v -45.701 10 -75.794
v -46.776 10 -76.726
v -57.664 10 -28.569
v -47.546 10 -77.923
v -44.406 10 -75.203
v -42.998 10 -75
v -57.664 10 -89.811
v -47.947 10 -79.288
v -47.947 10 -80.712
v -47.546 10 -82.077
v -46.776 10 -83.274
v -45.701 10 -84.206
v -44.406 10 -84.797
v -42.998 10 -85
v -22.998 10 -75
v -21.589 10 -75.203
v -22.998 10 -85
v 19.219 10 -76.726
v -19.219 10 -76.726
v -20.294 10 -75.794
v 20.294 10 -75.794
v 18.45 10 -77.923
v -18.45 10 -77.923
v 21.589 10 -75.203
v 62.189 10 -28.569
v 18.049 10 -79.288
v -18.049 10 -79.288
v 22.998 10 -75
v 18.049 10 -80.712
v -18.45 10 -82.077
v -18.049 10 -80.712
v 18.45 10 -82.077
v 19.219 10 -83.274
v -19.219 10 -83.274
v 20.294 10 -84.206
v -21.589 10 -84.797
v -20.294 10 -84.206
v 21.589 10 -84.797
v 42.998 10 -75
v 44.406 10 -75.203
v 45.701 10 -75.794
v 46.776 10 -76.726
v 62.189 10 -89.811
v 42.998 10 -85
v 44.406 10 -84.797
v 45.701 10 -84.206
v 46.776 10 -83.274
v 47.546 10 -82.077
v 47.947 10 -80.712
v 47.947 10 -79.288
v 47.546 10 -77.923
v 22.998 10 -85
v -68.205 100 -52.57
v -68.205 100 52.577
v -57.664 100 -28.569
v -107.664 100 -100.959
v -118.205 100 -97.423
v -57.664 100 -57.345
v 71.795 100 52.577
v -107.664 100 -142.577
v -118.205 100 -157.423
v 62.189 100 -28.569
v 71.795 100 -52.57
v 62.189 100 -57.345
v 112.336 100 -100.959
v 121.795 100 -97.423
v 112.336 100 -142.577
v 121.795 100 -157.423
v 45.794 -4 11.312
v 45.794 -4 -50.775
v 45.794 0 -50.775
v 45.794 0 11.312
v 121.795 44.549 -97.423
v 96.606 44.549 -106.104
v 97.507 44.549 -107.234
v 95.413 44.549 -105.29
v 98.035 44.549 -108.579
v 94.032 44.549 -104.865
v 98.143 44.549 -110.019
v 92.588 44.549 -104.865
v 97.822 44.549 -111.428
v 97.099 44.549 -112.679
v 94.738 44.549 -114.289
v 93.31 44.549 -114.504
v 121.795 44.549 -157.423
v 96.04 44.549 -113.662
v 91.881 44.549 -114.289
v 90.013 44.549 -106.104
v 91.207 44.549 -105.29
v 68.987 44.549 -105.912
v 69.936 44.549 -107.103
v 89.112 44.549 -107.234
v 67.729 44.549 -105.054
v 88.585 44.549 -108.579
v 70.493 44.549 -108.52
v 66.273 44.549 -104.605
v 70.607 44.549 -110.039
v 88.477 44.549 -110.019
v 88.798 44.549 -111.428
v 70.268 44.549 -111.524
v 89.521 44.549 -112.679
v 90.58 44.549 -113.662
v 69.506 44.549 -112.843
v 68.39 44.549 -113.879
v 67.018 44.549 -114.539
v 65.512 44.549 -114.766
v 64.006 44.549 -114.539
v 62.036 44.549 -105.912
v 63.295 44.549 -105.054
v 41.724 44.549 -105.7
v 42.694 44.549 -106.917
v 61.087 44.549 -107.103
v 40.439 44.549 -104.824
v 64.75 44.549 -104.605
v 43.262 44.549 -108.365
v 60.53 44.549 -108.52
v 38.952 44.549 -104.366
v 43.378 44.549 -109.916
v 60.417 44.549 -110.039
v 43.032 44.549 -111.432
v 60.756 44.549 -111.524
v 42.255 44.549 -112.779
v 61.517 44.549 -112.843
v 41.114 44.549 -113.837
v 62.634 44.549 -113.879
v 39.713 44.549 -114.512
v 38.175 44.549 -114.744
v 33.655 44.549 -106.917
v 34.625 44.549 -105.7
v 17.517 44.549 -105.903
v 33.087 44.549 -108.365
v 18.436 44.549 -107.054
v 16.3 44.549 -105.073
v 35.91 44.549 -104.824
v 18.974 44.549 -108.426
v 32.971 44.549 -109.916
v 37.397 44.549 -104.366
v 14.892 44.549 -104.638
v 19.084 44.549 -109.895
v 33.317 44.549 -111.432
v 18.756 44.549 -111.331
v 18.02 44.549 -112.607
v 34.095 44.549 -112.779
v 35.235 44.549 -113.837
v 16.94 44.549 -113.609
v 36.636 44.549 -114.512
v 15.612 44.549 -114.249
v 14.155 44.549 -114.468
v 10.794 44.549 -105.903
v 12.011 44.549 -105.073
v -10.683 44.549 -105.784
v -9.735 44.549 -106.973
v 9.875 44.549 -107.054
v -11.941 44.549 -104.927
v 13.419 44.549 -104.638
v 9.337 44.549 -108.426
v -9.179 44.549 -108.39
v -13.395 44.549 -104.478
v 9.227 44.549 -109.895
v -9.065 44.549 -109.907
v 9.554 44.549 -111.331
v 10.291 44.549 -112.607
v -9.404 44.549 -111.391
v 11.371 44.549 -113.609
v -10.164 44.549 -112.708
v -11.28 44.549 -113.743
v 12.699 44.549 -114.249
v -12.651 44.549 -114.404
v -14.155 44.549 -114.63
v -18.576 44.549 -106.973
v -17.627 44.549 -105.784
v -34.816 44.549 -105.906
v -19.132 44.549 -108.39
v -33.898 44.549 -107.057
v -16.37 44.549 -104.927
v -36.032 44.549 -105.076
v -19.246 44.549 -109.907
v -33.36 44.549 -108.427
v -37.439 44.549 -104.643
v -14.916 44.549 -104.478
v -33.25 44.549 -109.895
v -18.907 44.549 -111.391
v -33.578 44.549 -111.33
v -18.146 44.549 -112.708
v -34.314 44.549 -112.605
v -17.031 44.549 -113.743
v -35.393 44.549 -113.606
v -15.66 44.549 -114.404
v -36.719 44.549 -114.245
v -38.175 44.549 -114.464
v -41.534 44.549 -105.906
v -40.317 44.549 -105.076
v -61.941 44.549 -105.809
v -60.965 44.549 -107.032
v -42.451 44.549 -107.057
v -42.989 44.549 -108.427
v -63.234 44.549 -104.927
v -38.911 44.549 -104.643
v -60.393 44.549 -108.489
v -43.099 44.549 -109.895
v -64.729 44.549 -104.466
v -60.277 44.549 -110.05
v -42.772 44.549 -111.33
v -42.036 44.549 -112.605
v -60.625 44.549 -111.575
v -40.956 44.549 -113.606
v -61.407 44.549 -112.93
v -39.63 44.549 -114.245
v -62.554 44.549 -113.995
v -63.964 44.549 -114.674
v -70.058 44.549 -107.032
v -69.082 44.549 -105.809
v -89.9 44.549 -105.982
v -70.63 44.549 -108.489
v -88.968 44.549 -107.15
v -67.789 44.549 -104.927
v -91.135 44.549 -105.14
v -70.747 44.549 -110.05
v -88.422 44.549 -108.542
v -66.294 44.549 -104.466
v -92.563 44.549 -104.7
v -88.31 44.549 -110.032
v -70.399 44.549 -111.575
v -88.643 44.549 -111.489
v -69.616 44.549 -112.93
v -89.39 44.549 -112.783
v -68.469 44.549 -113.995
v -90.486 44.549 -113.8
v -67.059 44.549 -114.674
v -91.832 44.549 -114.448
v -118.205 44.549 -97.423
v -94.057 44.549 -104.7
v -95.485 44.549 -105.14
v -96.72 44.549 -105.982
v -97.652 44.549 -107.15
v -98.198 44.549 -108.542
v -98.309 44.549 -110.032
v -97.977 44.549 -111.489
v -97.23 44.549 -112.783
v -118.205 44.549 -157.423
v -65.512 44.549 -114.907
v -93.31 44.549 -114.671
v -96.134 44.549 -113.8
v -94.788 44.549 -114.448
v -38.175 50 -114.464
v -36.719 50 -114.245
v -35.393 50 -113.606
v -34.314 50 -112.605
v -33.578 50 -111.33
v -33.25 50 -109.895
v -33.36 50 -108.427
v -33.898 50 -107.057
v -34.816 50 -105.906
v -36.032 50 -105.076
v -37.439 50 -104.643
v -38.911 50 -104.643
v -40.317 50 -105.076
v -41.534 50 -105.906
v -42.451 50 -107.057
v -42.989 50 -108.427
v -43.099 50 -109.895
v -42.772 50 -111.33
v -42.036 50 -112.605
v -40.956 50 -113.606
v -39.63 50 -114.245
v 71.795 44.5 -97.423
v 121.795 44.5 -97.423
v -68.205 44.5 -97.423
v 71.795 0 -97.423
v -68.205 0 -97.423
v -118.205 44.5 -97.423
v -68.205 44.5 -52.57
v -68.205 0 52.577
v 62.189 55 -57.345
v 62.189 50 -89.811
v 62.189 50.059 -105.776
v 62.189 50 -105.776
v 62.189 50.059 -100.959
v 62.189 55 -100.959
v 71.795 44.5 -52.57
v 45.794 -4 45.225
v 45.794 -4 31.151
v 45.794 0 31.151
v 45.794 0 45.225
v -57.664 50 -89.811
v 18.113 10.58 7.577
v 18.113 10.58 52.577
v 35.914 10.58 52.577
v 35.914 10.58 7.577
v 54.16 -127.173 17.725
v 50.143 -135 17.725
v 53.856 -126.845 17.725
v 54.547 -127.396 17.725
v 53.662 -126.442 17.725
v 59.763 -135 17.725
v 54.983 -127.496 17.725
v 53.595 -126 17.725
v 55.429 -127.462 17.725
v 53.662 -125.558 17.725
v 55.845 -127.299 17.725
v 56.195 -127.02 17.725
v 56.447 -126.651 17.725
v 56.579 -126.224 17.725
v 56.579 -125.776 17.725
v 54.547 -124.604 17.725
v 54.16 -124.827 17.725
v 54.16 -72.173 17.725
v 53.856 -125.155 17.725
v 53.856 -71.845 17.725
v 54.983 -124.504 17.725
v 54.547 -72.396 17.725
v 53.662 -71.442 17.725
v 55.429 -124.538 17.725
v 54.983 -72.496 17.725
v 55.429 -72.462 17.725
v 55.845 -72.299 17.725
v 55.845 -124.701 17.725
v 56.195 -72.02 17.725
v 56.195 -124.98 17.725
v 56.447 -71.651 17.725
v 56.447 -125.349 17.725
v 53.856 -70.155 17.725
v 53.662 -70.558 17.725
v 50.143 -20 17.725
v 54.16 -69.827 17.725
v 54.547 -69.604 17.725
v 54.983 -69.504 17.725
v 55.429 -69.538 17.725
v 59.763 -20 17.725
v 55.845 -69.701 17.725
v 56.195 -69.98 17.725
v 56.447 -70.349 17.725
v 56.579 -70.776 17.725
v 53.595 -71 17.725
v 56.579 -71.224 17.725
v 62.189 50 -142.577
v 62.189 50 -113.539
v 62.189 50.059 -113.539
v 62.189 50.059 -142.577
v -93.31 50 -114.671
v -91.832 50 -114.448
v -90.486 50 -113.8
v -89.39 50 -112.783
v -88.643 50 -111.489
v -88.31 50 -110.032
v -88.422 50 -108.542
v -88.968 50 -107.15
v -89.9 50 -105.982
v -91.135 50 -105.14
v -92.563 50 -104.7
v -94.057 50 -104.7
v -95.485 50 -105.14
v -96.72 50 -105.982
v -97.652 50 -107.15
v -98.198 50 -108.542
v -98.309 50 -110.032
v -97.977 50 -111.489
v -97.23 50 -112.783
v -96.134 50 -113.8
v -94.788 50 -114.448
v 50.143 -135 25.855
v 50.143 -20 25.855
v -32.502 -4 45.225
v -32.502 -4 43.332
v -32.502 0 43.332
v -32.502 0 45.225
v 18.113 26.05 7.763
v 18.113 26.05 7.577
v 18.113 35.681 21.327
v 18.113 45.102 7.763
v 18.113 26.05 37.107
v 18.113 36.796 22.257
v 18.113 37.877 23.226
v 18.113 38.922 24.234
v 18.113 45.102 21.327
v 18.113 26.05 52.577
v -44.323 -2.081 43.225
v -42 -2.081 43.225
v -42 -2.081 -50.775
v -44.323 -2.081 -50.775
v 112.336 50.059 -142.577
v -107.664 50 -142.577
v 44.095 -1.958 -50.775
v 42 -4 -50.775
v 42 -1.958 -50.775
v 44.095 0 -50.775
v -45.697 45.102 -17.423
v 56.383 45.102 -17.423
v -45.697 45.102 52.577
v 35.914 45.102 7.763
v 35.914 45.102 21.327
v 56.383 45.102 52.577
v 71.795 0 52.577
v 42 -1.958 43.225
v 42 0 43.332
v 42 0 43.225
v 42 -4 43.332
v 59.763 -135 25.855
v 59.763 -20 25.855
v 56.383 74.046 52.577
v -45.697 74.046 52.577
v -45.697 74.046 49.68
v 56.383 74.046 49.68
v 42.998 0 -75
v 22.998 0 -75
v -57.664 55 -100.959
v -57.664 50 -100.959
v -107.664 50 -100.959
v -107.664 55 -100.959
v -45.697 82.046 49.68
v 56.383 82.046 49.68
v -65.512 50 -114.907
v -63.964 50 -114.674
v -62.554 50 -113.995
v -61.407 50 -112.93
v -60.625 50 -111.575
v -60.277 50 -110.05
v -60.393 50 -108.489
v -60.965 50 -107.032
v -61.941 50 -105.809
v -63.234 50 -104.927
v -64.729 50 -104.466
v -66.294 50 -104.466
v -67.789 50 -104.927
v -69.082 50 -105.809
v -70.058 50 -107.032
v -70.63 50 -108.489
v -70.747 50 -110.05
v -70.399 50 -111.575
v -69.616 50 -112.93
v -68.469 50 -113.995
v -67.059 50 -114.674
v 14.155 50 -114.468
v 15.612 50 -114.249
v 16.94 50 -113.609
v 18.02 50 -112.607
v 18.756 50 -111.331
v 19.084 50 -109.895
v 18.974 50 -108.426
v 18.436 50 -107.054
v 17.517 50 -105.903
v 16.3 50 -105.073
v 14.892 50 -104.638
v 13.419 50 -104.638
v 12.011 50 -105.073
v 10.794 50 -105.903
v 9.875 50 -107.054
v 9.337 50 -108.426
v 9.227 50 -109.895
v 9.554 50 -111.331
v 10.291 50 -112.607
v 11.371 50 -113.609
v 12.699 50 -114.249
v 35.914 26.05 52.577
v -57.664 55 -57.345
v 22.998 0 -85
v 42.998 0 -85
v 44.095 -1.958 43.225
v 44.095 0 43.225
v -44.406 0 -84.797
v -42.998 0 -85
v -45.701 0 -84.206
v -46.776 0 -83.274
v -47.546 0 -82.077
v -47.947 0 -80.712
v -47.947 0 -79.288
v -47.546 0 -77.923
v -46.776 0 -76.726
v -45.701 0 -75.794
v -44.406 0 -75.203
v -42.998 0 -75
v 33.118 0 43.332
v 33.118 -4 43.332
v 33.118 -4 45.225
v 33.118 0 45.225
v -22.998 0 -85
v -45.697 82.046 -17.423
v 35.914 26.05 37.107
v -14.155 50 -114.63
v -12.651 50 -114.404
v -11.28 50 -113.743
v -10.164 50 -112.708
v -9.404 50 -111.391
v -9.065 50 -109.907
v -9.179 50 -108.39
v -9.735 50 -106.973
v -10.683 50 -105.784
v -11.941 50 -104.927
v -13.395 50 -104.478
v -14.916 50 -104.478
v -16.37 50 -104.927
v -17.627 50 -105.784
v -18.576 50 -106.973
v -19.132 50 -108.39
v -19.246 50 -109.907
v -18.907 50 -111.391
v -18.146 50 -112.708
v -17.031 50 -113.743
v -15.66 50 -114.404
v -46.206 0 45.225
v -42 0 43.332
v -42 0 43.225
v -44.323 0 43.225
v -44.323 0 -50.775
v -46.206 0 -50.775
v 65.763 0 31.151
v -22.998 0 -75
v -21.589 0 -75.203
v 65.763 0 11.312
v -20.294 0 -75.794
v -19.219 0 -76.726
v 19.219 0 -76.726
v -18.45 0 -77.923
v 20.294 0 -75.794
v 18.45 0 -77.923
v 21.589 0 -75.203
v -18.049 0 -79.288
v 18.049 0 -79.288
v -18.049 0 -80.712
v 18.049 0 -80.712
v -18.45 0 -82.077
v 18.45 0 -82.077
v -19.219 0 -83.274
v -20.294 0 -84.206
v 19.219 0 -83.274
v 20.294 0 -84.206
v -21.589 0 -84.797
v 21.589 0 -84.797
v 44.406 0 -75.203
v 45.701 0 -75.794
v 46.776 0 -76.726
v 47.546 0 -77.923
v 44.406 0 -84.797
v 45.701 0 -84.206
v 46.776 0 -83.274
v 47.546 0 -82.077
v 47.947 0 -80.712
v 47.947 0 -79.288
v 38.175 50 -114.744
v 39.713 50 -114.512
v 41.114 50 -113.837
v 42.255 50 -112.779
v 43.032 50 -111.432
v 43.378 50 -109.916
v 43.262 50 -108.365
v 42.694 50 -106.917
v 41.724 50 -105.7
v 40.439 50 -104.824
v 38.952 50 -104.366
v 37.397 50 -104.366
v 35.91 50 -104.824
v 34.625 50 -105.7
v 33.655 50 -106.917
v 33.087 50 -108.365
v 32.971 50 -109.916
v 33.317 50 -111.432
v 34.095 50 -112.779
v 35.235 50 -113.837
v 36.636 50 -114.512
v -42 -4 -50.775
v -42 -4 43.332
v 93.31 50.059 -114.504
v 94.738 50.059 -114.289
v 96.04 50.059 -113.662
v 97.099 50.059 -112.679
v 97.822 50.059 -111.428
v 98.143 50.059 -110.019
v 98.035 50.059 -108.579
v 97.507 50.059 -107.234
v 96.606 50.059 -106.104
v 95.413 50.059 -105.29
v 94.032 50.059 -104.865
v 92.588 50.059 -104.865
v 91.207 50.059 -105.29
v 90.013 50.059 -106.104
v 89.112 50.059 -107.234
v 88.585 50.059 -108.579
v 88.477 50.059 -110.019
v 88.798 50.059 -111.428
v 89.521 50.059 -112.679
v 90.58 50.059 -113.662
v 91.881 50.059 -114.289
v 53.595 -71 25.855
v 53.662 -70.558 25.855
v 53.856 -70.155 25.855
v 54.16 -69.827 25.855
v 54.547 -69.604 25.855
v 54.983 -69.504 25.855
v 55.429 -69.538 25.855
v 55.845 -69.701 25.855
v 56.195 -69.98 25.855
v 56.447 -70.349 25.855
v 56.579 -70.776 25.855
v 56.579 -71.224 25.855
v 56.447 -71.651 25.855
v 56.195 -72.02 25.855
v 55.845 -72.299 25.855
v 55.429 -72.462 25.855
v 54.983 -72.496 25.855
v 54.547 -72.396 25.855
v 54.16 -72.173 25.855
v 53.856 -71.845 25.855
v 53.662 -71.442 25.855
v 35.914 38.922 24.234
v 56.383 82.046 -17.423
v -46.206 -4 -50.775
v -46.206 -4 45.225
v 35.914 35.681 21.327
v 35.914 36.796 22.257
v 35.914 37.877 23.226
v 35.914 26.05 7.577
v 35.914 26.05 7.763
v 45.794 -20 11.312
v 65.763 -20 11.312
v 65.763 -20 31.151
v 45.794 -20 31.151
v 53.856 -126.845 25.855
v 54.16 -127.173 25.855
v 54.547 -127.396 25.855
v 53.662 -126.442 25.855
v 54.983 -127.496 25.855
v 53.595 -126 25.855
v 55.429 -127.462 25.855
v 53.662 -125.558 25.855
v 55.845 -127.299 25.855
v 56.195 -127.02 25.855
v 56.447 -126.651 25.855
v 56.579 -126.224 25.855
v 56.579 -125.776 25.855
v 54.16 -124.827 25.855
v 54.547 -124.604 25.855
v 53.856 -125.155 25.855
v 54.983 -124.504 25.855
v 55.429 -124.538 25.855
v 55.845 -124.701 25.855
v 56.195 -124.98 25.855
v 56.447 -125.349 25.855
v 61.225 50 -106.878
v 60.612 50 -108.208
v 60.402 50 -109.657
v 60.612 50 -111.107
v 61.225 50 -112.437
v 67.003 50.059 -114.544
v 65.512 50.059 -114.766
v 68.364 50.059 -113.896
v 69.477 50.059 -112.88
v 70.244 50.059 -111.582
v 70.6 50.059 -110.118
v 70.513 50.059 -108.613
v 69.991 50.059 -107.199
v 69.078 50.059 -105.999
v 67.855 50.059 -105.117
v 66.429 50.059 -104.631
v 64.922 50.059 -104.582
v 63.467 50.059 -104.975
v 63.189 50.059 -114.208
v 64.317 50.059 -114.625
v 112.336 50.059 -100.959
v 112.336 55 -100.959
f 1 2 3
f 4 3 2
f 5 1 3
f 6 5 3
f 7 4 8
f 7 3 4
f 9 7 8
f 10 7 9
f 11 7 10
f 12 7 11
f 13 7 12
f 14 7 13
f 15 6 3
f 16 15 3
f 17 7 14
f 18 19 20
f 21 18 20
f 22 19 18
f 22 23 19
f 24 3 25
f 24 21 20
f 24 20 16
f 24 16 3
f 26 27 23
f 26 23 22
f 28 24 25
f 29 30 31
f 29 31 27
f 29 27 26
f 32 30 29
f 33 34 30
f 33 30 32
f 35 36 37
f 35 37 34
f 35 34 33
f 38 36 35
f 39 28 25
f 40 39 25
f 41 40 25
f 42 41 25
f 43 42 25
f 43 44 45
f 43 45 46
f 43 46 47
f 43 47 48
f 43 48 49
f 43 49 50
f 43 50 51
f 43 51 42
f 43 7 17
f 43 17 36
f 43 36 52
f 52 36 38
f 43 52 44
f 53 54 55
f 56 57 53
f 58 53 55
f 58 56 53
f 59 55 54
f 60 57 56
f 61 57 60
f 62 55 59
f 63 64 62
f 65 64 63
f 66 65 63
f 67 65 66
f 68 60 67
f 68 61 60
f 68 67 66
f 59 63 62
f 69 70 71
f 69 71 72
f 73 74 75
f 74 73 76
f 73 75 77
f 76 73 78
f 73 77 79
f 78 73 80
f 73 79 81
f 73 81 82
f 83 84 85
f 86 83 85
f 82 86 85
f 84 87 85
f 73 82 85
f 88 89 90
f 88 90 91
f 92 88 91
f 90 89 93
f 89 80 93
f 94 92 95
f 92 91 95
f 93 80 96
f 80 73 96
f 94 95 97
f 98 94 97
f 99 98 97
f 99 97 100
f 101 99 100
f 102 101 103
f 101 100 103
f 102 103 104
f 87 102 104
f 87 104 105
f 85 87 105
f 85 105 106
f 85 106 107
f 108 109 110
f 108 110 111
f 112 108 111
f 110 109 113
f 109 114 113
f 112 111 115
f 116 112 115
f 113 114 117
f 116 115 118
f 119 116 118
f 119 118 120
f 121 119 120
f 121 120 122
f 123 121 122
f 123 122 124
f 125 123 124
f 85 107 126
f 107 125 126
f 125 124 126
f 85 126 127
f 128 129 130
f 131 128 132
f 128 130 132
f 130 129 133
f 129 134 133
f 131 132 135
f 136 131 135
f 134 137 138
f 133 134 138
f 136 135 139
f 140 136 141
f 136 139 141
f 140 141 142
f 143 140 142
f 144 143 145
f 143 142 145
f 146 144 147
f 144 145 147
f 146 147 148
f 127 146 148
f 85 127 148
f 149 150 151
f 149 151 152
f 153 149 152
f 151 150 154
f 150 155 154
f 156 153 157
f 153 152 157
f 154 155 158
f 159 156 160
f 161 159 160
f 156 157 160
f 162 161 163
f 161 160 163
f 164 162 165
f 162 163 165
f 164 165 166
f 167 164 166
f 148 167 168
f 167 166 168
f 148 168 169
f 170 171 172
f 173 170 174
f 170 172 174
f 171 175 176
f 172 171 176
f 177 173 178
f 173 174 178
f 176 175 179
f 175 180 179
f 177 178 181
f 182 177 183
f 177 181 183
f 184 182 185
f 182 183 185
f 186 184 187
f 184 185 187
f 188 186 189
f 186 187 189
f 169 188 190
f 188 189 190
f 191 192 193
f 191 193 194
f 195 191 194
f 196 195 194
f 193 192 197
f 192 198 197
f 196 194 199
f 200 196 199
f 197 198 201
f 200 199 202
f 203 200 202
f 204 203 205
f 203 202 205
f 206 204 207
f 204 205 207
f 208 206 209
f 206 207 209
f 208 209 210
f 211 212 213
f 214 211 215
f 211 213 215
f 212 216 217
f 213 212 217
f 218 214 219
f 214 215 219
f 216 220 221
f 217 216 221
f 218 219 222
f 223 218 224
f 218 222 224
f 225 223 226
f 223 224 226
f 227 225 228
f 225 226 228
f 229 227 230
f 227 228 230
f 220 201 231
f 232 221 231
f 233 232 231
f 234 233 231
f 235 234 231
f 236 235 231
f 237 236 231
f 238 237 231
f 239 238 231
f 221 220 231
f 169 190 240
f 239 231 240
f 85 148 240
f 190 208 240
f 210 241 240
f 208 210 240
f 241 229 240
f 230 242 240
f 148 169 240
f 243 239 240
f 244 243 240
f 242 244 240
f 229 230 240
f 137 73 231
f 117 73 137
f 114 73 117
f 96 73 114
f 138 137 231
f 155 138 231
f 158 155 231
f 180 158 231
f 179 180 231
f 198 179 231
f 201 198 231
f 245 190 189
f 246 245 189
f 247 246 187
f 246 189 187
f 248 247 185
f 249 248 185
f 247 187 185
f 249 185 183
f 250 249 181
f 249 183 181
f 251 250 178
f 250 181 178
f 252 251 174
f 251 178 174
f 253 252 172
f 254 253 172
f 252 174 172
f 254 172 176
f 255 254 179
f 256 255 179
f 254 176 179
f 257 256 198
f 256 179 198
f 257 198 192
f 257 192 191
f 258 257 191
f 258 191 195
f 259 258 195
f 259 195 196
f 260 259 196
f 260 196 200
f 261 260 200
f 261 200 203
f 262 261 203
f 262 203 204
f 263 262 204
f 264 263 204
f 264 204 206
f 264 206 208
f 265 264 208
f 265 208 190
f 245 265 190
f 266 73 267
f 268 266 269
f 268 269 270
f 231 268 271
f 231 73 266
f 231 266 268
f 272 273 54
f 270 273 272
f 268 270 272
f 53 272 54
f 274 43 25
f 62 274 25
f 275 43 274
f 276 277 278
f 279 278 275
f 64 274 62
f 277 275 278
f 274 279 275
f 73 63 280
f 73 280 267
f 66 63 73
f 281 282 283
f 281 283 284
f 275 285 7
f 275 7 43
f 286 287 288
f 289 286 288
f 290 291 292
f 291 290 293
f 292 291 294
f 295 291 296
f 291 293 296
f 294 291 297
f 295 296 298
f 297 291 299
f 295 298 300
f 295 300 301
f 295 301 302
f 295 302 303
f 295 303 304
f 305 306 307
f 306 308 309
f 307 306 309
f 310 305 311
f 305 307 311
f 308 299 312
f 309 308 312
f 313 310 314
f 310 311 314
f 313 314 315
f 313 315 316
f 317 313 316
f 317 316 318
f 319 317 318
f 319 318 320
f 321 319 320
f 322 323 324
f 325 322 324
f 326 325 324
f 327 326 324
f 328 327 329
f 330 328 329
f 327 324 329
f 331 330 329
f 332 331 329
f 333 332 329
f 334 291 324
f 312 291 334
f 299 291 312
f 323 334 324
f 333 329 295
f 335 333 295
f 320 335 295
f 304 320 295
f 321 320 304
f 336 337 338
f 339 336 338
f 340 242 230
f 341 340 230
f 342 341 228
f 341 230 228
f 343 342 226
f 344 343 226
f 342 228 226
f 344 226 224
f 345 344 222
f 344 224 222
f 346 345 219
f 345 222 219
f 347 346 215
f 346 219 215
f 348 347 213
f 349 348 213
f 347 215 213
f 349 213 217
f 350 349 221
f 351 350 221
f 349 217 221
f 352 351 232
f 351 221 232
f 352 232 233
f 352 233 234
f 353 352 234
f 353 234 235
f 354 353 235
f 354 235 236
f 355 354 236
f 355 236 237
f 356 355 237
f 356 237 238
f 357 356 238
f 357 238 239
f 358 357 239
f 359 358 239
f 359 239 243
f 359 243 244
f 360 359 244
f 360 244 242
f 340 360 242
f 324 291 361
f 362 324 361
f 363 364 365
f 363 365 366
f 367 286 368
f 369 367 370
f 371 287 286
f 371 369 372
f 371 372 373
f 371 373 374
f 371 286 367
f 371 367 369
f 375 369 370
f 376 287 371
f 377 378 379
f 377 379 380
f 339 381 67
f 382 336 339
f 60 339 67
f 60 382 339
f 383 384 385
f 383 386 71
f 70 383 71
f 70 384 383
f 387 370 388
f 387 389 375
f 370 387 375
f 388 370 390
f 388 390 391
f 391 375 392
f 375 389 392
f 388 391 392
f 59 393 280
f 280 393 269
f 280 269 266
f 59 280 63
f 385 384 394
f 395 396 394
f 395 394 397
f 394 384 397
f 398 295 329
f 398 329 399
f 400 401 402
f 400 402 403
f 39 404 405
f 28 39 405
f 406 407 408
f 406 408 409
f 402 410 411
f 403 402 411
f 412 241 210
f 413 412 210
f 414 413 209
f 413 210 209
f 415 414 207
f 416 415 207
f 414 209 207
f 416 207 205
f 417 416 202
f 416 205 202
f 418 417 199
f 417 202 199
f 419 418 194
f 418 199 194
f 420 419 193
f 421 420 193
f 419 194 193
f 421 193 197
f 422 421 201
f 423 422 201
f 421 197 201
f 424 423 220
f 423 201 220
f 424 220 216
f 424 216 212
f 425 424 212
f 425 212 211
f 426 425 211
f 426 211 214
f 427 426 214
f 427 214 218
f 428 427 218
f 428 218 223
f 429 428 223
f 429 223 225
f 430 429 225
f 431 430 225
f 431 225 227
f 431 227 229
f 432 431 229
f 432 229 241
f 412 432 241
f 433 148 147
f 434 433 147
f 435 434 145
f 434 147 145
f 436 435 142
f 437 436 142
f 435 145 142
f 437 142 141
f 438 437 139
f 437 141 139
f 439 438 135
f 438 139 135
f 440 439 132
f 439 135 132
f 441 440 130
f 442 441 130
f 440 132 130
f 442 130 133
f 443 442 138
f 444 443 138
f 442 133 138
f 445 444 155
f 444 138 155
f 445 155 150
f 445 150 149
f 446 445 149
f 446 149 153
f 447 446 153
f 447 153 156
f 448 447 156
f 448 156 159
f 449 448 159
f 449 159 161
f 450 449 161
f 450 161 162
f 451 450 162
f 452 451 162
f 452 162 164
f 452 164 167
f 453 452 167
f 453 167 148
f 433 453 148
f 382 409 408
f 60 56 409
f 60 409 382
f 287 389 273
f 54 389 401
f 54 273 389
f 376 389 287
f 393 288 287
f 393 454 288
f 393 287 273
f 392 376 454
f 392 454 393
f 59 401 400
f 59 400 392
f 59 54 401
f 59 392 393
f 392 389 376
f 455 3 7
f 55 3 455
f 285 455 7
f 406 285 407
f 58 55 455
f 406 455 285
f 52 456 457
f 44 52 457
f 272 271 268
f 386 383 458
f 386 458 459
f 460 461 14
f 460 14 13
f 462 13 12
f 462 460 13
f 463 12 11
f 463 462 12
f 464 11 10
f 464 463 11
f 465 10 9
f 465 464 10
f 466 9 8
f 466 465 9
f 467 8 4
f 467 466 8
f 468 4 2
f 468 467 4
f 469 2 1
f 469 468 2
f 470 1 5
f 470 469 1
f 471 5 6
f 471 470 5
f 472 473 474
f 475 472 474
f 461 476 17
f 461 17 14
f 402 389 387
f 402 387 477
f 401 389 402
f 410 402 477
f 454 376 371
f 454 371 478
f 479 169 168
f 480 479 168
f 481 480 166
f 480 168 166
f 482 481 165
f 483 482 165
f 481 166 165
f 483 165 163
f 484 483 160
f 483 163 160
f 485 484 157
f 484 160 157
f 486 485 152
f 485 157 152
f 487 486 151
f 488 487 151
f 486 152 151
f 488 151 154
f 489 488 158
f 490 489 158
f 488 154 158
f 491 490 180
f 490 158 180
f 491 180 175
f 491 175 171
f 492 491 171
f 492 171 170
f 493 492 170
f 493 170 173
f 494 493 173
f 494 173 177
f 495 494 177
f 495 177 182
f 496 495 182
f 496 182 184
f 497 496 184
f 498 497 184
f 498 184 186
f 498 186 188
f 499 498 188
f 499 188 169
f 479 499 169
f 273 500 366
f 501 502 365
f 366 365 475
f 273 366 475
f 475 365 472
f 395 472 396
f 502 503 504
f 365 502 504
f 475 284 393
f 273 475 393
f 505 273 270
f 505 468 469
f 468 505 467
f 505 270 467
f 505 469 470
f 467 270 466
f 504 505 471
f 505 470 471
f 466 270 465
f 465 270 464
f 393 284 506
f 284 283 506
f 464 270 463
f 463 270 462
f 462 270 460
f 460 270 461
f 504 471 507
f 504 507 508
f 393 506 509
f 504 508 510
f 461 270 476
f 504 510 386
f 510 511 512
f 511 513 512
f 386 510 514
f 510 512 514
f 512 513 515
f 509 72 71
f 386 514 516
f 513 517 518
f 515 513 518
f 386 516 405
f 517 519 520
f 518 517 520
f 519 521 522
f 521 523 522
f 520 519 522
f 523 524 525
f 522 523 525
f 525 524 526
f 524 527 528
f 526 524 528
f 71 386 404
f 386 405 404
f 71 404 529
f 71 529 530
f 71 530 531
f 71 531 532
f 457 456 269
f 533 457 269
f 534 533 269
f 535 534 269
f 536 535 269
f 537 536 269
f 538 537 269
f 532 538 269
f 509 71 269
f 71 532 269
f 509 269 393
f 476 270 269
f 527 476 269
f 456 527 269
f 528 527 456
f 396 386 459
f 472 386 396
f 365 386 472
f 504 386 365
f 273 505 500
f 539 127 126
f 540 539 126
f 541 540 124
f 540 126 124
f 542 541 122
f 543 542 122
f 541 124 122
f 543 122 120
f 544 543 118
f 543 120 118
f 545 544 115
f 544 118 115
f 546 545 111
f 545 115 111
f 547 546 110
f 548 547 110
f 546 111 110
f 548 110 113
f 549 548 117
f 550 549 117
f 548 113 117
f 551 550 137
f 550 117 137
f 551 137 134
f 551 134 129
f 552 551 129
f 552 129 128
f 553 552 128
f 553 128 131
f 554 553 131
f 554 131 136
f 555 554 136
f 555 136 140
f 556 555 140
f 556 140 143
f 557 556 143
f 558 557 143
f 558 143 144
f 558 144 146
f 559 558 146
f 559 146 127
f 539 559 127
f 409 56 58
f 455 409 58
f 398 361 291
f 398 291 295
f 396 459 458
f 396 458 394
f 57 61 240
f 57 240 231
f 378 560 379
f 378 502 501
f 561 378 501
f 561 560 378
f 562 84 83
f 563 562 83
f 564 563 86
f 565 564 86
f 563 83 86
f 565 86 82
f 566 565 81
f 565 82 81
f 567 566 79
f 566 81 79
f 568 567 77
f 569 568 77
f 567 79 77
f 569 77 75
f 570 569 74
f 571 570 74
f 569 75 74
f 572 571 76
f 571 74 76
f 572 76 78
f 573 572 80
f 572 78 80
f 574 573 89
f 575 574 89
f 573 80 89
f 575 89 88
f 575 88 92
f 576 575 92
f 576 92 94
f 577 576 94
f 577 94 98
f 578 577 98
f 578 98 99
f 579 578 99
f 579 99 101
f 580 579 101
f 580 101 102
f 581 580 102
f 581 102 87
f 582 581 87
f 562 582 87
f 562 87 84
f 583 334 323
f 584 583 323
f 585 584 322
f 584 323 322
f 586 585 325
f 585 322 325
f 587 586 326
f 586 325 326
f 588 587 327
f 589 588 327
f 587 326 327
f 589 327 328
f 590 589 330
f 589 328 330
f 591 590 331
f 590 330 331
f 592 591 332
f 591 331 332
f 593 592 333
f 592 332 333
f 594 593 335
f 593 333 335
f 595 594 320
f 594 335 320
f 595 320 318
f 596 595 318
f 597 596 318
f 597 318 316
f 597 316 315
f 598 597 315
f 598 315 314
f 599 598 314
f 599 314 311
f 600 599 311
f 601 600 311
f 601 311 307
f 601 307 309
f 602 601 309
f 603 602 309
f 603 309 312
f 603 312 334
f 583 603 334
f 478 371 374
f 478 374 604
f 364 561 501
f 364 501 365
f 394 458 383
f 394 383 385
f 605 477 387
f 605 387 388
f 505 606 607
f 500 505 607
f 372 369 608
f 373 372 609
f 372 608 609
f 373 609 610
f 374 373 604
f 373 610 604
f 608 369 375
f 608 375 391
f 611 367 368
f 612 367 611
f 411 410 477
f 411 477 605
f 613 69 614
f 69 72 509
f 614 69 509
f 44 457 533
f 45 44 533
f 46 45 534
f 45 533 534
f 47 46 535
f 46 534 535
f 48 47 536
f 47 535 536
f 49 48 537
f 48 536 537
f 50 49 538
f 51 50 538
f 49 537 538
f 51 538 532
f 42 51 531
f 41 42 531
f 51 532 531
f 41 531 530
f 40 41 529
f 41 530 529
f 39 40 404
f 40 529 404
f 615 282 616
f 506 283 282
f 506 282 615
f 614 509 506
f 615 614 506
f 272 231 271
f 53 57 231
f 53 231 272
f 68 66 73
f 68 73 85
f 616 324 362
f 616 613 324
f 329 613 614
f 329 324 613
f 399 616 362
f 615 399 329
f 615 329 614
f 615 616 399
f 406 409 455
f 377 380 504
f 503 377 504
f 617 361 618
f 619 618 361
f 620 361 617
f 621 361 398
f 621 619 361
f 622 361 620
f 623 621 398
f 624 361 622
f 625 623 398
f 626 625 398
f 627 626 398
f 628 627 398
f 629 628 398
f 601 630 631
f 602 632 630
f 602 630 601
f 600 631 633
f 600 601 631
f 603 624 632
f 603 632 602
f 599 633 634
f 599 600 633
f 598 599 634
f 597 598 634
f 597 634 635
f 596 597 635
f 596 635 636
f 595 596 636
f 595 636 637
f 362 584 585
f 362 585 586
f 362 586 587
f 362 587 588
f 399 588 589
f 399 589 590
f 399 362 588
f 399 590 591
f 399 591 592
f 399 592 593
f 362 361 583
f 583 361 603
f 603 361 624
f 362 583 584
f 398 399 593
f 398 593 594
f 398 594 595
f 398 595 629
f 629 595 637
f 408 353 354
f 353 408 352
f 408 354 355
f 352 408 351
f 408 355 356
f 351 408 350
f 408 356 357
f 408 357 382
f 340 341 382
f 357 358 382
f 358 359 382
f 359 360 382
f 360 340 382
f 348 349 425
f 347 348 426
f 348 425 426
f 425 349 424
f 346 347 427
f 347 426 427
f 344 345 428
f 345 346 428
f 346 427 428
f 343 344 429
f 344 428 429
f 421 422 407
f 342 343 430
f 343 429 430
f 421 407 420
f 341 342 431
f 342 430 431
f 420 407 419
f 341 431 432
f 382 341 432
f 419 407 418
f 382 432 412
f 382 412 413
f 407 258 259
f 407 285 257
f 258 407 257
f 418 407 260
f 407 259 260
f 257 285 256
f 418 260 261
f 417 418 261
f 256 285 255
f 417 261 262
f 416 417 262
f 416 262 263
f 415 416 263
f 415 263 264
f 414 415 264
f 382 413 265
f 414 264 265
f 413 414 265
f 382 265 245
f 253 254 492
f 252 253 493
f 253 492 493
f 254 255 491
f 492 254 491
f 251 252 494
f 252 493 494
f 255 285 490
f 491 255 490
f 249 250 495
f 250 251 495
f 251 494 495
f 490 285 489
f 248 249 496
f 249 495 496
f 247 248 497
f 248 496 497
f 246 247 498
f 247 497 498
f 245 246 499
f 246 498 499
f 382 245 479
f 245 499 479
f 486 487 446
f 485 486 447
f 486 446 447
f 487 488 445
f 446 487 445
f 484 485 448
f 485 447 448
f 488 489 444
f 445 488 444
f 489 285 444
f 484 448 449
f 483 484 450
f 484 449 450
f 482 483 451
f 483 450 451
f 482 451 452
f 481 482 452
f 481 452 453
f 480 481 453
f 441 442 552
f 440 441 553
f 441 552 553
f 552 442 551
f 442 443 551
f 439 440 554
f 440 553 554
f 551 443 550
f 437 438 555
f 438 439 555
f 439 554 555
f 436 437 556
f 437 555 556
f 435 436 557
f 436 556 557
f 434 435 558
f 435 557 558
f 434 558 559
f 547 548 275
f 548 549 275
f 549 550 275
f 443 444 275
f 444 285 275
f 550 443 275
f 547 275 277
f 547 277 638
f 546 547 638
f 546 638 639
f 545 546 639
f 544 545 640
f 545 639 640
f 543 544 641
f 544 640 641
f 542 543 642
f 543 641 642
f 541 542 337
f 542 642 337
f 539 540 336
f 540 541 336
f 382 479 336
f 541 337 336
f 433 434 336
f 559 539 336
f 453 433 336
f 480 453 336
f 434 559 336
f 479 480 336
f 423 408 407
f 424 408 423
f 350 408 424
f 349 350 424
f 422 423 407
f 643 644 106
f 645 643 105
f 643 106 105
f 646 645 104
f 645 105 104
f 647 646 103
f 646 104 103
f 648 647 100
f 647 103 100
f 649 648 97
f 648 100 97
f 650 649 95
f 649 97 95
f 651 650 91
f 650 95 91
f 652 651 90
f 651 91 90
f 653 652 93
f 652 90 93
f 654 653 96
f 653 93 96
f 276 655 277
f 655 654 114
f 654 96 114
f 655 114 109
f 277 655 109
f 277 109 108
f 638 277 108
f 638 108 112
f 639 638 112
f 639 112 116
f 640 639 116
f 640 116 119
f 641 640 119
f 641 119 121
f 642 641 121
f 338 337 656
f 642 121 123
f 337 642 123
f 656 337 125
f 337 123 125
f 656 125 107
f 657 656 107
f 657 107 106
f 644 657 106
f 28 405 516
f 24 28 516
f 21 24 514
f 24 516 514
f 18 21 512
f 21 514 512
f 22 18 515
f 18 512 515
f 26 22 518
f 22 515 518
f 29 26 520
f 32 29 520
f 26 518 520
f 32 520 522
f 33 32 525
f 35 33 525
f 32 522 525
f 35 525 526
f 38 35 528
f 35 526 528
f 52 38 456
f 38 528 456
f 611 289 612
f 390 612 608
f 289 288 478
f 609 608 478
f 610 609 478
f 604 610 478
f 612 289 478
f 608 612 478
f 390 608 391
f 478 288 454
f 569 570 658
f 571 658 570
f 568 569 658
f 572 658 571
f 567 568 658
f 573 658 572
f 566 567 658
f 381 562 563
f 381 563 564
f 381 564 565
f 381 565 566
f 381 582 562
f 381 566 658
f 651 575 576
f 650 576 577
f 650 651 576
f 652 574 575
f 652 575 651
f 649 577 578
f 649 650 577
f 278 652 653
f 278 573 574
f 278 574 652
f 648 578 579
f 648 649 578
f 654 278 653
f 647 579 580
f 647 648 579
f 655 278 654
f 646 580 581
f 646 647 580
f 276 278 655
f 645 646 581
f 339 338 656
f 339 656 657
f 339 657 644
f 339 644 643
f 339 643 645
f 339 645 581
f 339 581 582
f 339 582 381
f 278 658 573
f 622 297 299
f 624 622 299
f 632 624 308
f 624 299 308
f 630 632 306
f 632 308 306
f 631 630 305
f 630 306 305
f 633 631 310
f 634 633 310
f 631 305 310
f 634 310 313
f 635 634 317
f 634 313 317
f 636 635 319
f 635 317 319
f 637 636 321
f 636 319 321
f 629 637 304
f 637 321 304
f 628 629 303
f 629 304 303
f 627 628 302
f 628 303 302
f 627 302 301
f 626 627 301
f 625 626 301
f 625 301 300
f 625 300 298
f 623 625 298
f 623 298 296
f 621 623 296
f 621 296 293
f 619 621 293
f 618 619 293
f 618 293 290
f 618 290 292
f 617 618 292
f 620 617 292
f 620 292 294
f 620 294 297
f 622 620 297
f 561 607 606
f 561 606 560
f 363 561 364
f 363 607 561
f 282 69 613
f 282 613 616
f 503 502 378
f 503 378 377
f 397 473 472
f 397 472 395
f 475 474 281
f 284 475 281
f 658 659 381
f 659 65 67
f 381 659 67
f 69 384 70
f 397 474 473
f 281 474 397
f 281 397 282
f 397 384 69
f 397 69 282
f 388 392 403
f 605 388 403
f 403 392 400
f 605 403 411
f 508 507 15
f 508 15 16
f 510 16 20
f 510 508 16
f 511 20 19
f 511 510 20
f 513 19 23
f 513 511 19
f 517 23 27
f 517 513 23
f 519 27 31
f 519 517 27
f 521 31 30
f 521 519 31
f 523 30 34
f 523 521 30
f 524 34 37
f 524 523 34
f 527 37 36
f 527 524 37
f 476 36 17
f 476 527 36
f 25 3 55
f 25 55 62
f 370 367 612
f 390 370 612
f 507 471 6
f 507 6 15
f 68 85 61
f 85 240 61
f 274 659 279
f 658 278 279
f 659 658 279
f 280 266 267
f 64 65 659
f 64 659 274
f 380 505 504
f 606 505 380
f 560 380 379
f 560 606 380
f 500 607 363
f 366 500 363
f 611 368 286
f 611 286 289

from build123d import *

# Parameters (mm, degrees)
SKETCH_8_W           = 140
SKETCH_8_H           = 130
EXTRUDE_2_DEPTH      = 100
SKETCH_9_W           = 119.853608507
SKETCH_9_H           = 114.241733861
CUT_EXTRUDE_2_DEPTH  = 90
SKETCH_10_W          = 140
SKETCH_10_H          = 55.45062913
EXTRUDE_3_DEPTH      = 60
SKETCH_11_W          = 119.853608507
SKETCH_11_H          = 52.765862156
CUT_EXTRUDE_3_DEPTH  = 50
SKETCH_12_W          = 60
SKETCH_12_H          = 55.45062913
EXTRUDE_4_DEPTH      = 50
SKETCH_13_W          = 60
SKETCH_13_H          = 55.45062913
EXTRUDE_5_DEPTH      = 50
SKETCH_15_W          = 41.61767962
SKETCH_15_H          = 50
CUT_EXTRUDE_5_DEPTH  = 50
SKETCH_16_W          = 41.61767962
SKETCH_16_H          = 49.940605531
CUT_EXTRUDE_6_DEPTH  = 220
SKETCH_18_W          = 140
SKETCH_18_H          = 100
EXTRUDE_6_DEPTH      = 20
SKETCH_19_W          = 119.853608507
SKETCH_19_H          = 90
CUT_EXTRUDE_7_DEPTH  = 17
CUT_EXTRUDE_8_DEPTH  = 17
SKETCH_29_R          = 5.01352521
SKETCH_29_R_2        = 5.249816441
SKETCH_29_R_3        = 4.93835751
SKETCH_29_R_4        = 5.104719563
SKETCH_29_R_5        = 4.942569228
SKETCH_29_R_6        = 5.218376227
SKETCH_29_R_7        = 5.109275874
SKETCH_29_R_8        = 4.846735289
CUT_EXTRUDE_9_DEPTH  = 17
EXTRUDE_9_DEPTH      = 4
SKETCH_37_W          = 2
SKETCH_37_H          = 96
EXTRUDE_10_DEPTH     = 4
SKETCH_39_W          = 84
SKETCH_39_H          = 94.106669422
CUT_EXTRUDE_10_DEPTH = 4
SKETCH_40_W          = 2.323035316
SKETCH_40_H          = 2.081311216
CUT_EXTRUDE_12_DEPTH = 94
SKETCH_42_W          = 2.095402412
SKETCH_42_H          = 1.958248824
CUT_EXTRUDE_13_DEPTH = 94
SKETCH_43_W          = 9.619264996
SKETCH_43_H          = 8.129833148
EXTRUDE_11_DEPTH     = 135
SKETCH_44_R          = 1.5
CUT_EXTRUDE_14_DEPTH = 40
SKETCH_45_W          = 19.969543159
SKETCH_45_H          = 19.838905337
EXTRUDE_12_DEPTH     = 20
EXTRUDE_13_DEPTH     = 55.5
CUT_EXTRUDE_15_DEPTH = 45
SKETCH_50_W          = 119.853608507
SKETCH_50_H          = 70
EXTRUDE_14_DEPTH     = 90
SKETCH_51_W          = 102.080516597
SKETCH_51_H          = 36.944055187
CUT_EXTRUDE_17_DEPTH = 70
SKETCH_52_W          = 102.571773441
SKETCH_52_H          = 2.896860024
EXTRUDE_16_DEPTH     = 8
SKETCH_54_W          = 65.620335911
SKETCH_54_H          = 1.893330578
CUT_EXTRUDE_18_DEPTH = 4
SKETCH_55_W          = 6.653347609
SKETCH_55_H          = 11.160454054
EXTRUDE_17_DEPTH     = 8
SKETCH_56_W          = 4.450383643
SKETCH_56_H          = 9.96038244
EXTRUDE_18_DEPTH     = 8
SKETCH_57_R          = 1.5
CUT_EXTRUDE_19_DEPTH = 20
SKETCH_58_W          = 17.801534575
SKETCH_58_H          = 15.470381237
CUT_EXTRUDE_21_DEPTH = 45
SKETCH_59_W          = 17.801534575
SKETCH_59_H          = 13.564090588
CUT_EXTRUDE_22_DEPTH = 25
SKETCH_62_W          = 17.801534575
SKETCH_62_H          = 40.082559496
CUT_REVOLVE_1_ANGLE  = 45


with BuildPart() as part:
    # 草图8 → 凸台-拉伸2 (new body)
    with BuildSketch(Plane(origin=(0, 0, 0), x_dir=(1, 0, 0), z_dir=(0, 1, 0))):
        with Locations((1.794871795, 32.423076923)):
            Rectangle(SKETCH_8_W, SKETCH_8_H)
    extrude(amount=EXTRUDE_2_DEPTH)

    # 草图9 → 切除-拉伸2 (cut)
    with BuildSketch(Plane(origin=(0, 100, 0), x_dir=(1, 0, 0), z_dir=(0, 1, 0))):
        with Locations((2.262528015, 32.69030905)):
            Rectangle(SKETCH_9_W, SKETCH_9_H)
    extrude(amount=-CUT_EXTRUDE_2_DEPTH, mode=Mode.SUBTRACT)

    # 草图10 → 凸台-拉伸3 (add)
    with BuildSketch(Plane(origin=(0, 0, -97.423076923), x_dir=(-1, 0, 0), z_dir=(0, 0, -1))):
        with Locations((-1.794871795, 72.274685435)):
            Rectangle(SKETCH_10_W, SKETCH_10_H)
    extrude(amount=EXTRUDE_3_DEPTH)

    # 草图11 → 切除-拉伸3 (cut)
    with BuildSketch(Plane(origin=(0, 100, 0), x_dir=(1, 0, 0), z_dir=(0, 1, 0))):
        with Locations((2.262528015, 116.194107058)):
            Rectangle(SKETCH_11_W, SKETCH_11_H)
    extrude(amount=-CUT_EXTRUDE_3_DEPTH, mode=Mode.SUBTRACT)

    # 草图12 → 凸台-拉伸4 (add)
    with BuildSketch(Plane.ZY.offset(68.205128205)):
        with Locations((-127.423076923, 72.274685435)):
            Rectangle(SKETCH_12_W, SKETCH_12_H)
    extrude(amount=EXTRUDE_4_DEPTH)

    # 草图13 → 凸台-拉伸5 (add)
    with BuildSketch(Plane(origin=(71.794871795, 0, 0), x_dir=(0, 0, -1), z_dir=(1, 0, 0))):
        with Locations((127.423076923, 72.274685435)):
            Rectangle(SKETCH_13_W, SKETCH_13_H)
    extrude(amount=EXTRUDE_5_DEPTH)

    # 草图15 → 切除-拉伸5 (cut)
    with BuildSketch(Plane(origin=(-57.664276238, 0, 0), x_dir=(0, 0, -1), z_dir=(1, 0, 0))):
        with Locations((121.768198326, 75)):
            Rectangle(SKETCH_15_W, SKETCH_15_H)
    extrude(amount=-CUT_EXTRUDE_5_DEPTH, mode=Mode.SUBTRACT)

    # 草图16 → 切除-拉伸6 (cut)
    with BuildSketch(Plane(origin=(-107.664276238, 0, 0), x_dir=(0, 0, -1), z_dir=(1, 0, 0))):
        with Locations((121.768198326, 75.029697235)):
            Rectangle(SKETCH_16_W, SKETCH_16_H)
    extrude(amount=CUT_EXTRUDE_6_DEPTH, mode=Mode.SUBTRACT)

    # 草图18 → 凸台-拉伸6 (add)
    with BuildSketch(Plane.XY.offset(32.576923077)):
        with Locations((1.794871795, 50)):
            Rectangle(SKETCH_18_W, SKETCH_18_H)
    extrude(amount=EXTRUDE_6_DEPTH)

    # 草图19 → 切除-拉伸7 (cut)
    with BuildSketch(Plane(origin=(0, 0, 24.430557881), x_dir=(-1, 0, 0), z_dir=(0, 0, -1))):
        with Locations((-2.262528015, 55)):
            Rectangle(SKETCH_19_W, SKETCH_19_H)
    extrude(amount=-CUT_EXTRUDE_7_DEPTH, mode=Mode.SUBTRACT)

    # 草图20 → 切除-拉伸8 (cut)
    with BuildSketch(Plane.XZ):
        with BuildLine():
            Line((-42.997677053, -75), (-22.997677053, -75))
            ThreePointArc((-22.997677053, -75), (-17.997677053, -80), (-22.997677053, -85))
            Line((-22.997677053, -85), (-42.997677053, -85))
            ThreePointArc((-42.997677053, -85), (-47.997677053, -80), (-42.997677053, -75))
        make_face()
        with BuildLine():
            Line((22.997677053, -85), (42.997677053, -85))
            ThreePointArc((42.997677053, -85), (47.997677053, -80), (42.997677053, -75))
            Line((42.997677053, -75), (22.997677053, -75))
            ThreePointArc((22.997677053, -75), (17.997677053, -80), (22.997677053, -85))
        make_face()
    extrude(amount=-CUT_EXTRUDE_8_DEPTH, mode=Mode.SUBTRACT)

    # 草图29 → 切除-拉伸9 (cut)
    with BuildSketch(Plane.XZ.offset(-44.54937087)):
        with Locations(Location((-93.309871888, -109.657200503, 0), (0, 0, 270))):
            Circle(SKETCH_29_R)
        with Locations(Location((-65.511669659, -109.657200503, 0), (0, 0, 270))):
            Circle(SKETCH_29_R_2)
        with Locations(Location((-38.174617175, -109.525727046, 0), (0, 0, 270))):
            Circle(SKETCH_29_R_3)
        with Locations(Location((-14.155387991, -109.525727046, 0), (0, 0, 270))):
            Circle(SKETCH_29_R_4)
        with Locations(Location((14.155387991, -109.525727046, 0), (0, 0, 270))):
            Circle(SKETCH_29_R_5)
        with Locations(Location((38.174617175, -109.525727046, 0), (0, 0, 270))):
            Circle(SKETCH_29_R_6)
        with Locations(Location((65.511669659, -109.657200503, 0), (0, 0, 270))):
            Circle(SKETCH_29_R_7)
        with Locations(Location((93.309871888, -109.657200503, 0), (0, 0, 270))):
            Circle(SKETCH_29_R_8)
    extrude(amount=-CUT_EXTRUDE_9_DEPTH, mode=Mode.SUBTRACT)

    # 草图17 → 凸台-拉伸9 (add)
    with BuildSketch(Plane(origin=(0, 0, 0), x_dir=(-1, 0, 0), z_dir=(0, -1, 0))):
        Polygon((44.206117019, 0), (44.206117019, -45.225446523), (-43.793882981, -45.225446523), (-43.793882981, 0), (-43.793882981, 50.774553477), (44.206117019, 50.774553477), align=None)
    extrude(amount=EXTRUDE_9_DEPTH)

    # 草图37 → 凸台-拉伸10 (add)
    with BuildSketch(Plane.XZ.offset(4)):
        with Locations((-45.206117019, -2.774553477)):
            Rectangle(SKETCH_37_W, SKETCH_37_H)
        with Locations((44.793882981, -2.774553477)):
            Rectangle(SKETCH_37_W, SKETCH_37_H)
    extrude(amount=-EXTRUDE_10_DEPTH)

    # 草图39 → 切除-拉伸10 (cut)
    with BuildSketch(Plane.XZ.offset(4)):
        with Locations((0, -3.721218766)):
            Rectangle(SKETCH_39_W, SKETCH_39_H)
    extrude(amount=-CUT_EXTRUDE_10_DEPTH, mode=Mode.SUBTRACT)

    # 草图40 → 切除-拉伸12 (cut)
    with BuildSketch(Plane(origin=(0, 0, -50.774553477), x_dir=(-1, 0, 0), z_dir=(0, 0, -1))):
        with Locations((43.161517658, -1.040655608)):
            Rectangle(SKETCH_40_W, SKETCH_40_H)
    extrude(amount=-CUT_EXTRUDE_12_DEPTH, mode=Mode.SUBTRACT)

    # 草图42 → 切除-拉伸13 (cut)
    with BuildSketch(Plane(origin=(0, 0, -50.774553477), x_dir=(-1, 0, 0), z_dir=(0, 0, -1))):
        with Locations((-43.047701206, -0.979124412)):
            Rectangle(SKETCH_42_W, SKETCH_42_H)
    extrude(amount=-CUT_EXTRUDE_13_DEPTH, mode=Mode.SUBTRACT)

    # 草图43 → 凸台-拉伸11 (add)
    with BuildSketch(Plane.XZ):
        with Locations((54.952979828, 21.790363097)):
            Rectangle(SKETCH_43_W, SKETCH_43_H)
    extrude(amount=EXTRUDE_11_DEPTH)

    # 草图44 → 切除-拉伸14 (cut)
    with BuildSketch(Plane(origin=(0, 0, 17.725446523), x_dir=(-1, 0, 0), z_dir=(0, 0, -1))):
        with Locations((-55.095402412, -71)):
            Circle(SKETCH_44_R)
        with Locations((-55.095402412, -127)):
            Circle(SKETCH_44_R)
    extrude(amount=-CUT_EXTRUDE_14_DEPTH, mode=Mode.SUBTRACT)

    # 草图45 → 凸台-拉伸12 (add)
    with BuildSketch(Plane.XZ):
        with Locations((55.778654561, 21.231716271)):
            Rectangle(SKETCH_45_W, SKETCH_45_H)
    extrude(amount=EXTRUDE_12_DEPTH)

    # 草图46 → 凸台-拉伸13 (add)
    with BuildSketch(Plane(origin=(0, 100, 0), x_dir=(1, 0, 0), z_dir=(0, 1, 0))):
        Polygon((-118.205128205, 97.423076923), (-68.205128205, 52.570357533), (-68.205128205, 97.423076923), align=None)
        Polygon((71.794871795, 97.423076923), (71.794871795, 52.570357533), (121.794871795, 97.423076923), align=None)
    extrude(amount=-EXTRUDE_13_DEPTH)

    # 草图47 → 切除-拉伸15 (cut)
    with BuildSketch(Plane(origin=(0, 100, 0), x_dir=(1, 0, 0), z_dir=(0, 1, 0))):
        Polygon((-107.664276238, 100.959358516), (-57.664276238, 57.344666553), (-57.664276238, 100.959358516), align=None)
        Polygon((112.335723762, 100.959358516), (62.189332269, 57.344666553), (62.189332269, 100.959358516), align=None)
    extrude(amount=-CUT_EXTRUDE_15_DEPTH, mode=Mode.SUBTRACT)

    # 草图50 → 凸台-拉伸14 (add)
    with BuildSketch(Plane(origin=(0, 10, 0), x_dir=(1, 0, 0), z_dir=(0, 1, 0))):
        with Locations((2.262528015, -6.430557881)):
            Rectangle(SKETCH_50_W, SKETCH_50_H)
    extrude(amount=EXTRUDE_14_DEPTH)

    # 草图51 → 切除-拉伸17 (cut)
    with BuildSketch(Plane.XY.offset(52.576923077)):
        with Locations((5.343057287, 63.574399949)):
            Rectangle(SKETCH_51_W, SKETCH_51_H)
    extrude(amount=-CUT_EXTRUDE_17_DEPTH, mode=Mode.SUBTRACT)

    # 草图52 → 凸台-拉伸16 (add)
    with BuildSketch(Plane.XZ.offset(-82.046427542)):
        with Locations((5.588685709, 51.128493065)):
            Rectangle(SKETCH_52_W, SKETCH_52_H)
    extrude(amount=EXTRUDE_16_DEPTH)

    # 草图54 → 切除-拉伸18 (cut)
    with BuildSketch(Plane.XZ.offset(4)):
        with Locations((0.307674718, 44.278781234)):
            Rectangle(SKETCH_54_W, SKETCH_54_H)
    extrude(amount=-CUT_EXTRUDE_18_DEPTH, mode=Mode.SUBTRACT)

    # 草图55 → 凸台-拉伸17 (add)
    with BuildSketch(Plane(origin=(0, 0, 17.725446523), x_dir=(-1, 0, 0), z_dir=(0, 0, -1))):
        with Locations((-54.914340612, -127.919346869)):
            Rectangle(SKETCH_55_W, SKETCH_55_H)
    extrude(amount=-EXTRUDE_17_DEPTH)

    # 草图56 → 凸台-拉伸18 (add)
    with BuildSketch(Plane.XY.offset(25.855279671)):
        with Locations((55.093514005, -127.911898971)):
            Rectangle(SKETCH_56_W, SKETCH_56_H)
    extrude(amount=-EXTRUDE_18_DEPTH)

    # 草图57 → 切除-拉伸19 (cut)
    with BuildSketch(Plane(origin=(0, 0, 17.725446523), x_dir=(-1, 0, 0), z_dir=(0, 0, -1))):
        with Locations((-55.095402412, -126)):
            Circle(SKETCH_57_R)
    extrude(amount=-CUT_EXTRUDE_19_DEPTH, mode=Mode.SUBTRACT)

    # 草图58 → 切除-拉伸21 (cut)
    with BuildSketch(Plane.XY.offset(52.576923077)):
        with Locations((27.013712443, 18.31499218)):
            Rectangle(SKETCH_58_W, SKETCH_58_H)
    extrude(amount=-CUT_EXTRUDE_21_DEPTH, mode=Mode.SUBTRACT)

    # 草图59 → 切除-拉伸22 (cut)
    with BuildSketch(Plane.XZ.offset(-26.050182799)):
        with Locations((27.013712443, 14.545045525)):
            Rectangle(SKETCH_59_W, SKETCH_59_H)
    extrude(amount=-CUT_EXTRUDE_22_DEPTH, mode=Mode.SUBTRACT)

    # 草图62 → 切除-旋转1 (revolve, cut)
    with BuildSketch(Plane(origin=(0, 10.579801562, 0), x_dir=(1, 0, 0), z_dir=(0, 1, 0))):
        with Locations((27.013712443, -32.535643329)):
            Rectangle(SKETCH_62_W, SKETCH_62_H)
    revolve(axis=Axis((18.112945155, 10.579801562, 52.576923077), (1, 0, 0)), revolution_arc=CUT_REVOLVE_1_ANGLE, mode=Mode.SUBTRACT)


solid = part.part
